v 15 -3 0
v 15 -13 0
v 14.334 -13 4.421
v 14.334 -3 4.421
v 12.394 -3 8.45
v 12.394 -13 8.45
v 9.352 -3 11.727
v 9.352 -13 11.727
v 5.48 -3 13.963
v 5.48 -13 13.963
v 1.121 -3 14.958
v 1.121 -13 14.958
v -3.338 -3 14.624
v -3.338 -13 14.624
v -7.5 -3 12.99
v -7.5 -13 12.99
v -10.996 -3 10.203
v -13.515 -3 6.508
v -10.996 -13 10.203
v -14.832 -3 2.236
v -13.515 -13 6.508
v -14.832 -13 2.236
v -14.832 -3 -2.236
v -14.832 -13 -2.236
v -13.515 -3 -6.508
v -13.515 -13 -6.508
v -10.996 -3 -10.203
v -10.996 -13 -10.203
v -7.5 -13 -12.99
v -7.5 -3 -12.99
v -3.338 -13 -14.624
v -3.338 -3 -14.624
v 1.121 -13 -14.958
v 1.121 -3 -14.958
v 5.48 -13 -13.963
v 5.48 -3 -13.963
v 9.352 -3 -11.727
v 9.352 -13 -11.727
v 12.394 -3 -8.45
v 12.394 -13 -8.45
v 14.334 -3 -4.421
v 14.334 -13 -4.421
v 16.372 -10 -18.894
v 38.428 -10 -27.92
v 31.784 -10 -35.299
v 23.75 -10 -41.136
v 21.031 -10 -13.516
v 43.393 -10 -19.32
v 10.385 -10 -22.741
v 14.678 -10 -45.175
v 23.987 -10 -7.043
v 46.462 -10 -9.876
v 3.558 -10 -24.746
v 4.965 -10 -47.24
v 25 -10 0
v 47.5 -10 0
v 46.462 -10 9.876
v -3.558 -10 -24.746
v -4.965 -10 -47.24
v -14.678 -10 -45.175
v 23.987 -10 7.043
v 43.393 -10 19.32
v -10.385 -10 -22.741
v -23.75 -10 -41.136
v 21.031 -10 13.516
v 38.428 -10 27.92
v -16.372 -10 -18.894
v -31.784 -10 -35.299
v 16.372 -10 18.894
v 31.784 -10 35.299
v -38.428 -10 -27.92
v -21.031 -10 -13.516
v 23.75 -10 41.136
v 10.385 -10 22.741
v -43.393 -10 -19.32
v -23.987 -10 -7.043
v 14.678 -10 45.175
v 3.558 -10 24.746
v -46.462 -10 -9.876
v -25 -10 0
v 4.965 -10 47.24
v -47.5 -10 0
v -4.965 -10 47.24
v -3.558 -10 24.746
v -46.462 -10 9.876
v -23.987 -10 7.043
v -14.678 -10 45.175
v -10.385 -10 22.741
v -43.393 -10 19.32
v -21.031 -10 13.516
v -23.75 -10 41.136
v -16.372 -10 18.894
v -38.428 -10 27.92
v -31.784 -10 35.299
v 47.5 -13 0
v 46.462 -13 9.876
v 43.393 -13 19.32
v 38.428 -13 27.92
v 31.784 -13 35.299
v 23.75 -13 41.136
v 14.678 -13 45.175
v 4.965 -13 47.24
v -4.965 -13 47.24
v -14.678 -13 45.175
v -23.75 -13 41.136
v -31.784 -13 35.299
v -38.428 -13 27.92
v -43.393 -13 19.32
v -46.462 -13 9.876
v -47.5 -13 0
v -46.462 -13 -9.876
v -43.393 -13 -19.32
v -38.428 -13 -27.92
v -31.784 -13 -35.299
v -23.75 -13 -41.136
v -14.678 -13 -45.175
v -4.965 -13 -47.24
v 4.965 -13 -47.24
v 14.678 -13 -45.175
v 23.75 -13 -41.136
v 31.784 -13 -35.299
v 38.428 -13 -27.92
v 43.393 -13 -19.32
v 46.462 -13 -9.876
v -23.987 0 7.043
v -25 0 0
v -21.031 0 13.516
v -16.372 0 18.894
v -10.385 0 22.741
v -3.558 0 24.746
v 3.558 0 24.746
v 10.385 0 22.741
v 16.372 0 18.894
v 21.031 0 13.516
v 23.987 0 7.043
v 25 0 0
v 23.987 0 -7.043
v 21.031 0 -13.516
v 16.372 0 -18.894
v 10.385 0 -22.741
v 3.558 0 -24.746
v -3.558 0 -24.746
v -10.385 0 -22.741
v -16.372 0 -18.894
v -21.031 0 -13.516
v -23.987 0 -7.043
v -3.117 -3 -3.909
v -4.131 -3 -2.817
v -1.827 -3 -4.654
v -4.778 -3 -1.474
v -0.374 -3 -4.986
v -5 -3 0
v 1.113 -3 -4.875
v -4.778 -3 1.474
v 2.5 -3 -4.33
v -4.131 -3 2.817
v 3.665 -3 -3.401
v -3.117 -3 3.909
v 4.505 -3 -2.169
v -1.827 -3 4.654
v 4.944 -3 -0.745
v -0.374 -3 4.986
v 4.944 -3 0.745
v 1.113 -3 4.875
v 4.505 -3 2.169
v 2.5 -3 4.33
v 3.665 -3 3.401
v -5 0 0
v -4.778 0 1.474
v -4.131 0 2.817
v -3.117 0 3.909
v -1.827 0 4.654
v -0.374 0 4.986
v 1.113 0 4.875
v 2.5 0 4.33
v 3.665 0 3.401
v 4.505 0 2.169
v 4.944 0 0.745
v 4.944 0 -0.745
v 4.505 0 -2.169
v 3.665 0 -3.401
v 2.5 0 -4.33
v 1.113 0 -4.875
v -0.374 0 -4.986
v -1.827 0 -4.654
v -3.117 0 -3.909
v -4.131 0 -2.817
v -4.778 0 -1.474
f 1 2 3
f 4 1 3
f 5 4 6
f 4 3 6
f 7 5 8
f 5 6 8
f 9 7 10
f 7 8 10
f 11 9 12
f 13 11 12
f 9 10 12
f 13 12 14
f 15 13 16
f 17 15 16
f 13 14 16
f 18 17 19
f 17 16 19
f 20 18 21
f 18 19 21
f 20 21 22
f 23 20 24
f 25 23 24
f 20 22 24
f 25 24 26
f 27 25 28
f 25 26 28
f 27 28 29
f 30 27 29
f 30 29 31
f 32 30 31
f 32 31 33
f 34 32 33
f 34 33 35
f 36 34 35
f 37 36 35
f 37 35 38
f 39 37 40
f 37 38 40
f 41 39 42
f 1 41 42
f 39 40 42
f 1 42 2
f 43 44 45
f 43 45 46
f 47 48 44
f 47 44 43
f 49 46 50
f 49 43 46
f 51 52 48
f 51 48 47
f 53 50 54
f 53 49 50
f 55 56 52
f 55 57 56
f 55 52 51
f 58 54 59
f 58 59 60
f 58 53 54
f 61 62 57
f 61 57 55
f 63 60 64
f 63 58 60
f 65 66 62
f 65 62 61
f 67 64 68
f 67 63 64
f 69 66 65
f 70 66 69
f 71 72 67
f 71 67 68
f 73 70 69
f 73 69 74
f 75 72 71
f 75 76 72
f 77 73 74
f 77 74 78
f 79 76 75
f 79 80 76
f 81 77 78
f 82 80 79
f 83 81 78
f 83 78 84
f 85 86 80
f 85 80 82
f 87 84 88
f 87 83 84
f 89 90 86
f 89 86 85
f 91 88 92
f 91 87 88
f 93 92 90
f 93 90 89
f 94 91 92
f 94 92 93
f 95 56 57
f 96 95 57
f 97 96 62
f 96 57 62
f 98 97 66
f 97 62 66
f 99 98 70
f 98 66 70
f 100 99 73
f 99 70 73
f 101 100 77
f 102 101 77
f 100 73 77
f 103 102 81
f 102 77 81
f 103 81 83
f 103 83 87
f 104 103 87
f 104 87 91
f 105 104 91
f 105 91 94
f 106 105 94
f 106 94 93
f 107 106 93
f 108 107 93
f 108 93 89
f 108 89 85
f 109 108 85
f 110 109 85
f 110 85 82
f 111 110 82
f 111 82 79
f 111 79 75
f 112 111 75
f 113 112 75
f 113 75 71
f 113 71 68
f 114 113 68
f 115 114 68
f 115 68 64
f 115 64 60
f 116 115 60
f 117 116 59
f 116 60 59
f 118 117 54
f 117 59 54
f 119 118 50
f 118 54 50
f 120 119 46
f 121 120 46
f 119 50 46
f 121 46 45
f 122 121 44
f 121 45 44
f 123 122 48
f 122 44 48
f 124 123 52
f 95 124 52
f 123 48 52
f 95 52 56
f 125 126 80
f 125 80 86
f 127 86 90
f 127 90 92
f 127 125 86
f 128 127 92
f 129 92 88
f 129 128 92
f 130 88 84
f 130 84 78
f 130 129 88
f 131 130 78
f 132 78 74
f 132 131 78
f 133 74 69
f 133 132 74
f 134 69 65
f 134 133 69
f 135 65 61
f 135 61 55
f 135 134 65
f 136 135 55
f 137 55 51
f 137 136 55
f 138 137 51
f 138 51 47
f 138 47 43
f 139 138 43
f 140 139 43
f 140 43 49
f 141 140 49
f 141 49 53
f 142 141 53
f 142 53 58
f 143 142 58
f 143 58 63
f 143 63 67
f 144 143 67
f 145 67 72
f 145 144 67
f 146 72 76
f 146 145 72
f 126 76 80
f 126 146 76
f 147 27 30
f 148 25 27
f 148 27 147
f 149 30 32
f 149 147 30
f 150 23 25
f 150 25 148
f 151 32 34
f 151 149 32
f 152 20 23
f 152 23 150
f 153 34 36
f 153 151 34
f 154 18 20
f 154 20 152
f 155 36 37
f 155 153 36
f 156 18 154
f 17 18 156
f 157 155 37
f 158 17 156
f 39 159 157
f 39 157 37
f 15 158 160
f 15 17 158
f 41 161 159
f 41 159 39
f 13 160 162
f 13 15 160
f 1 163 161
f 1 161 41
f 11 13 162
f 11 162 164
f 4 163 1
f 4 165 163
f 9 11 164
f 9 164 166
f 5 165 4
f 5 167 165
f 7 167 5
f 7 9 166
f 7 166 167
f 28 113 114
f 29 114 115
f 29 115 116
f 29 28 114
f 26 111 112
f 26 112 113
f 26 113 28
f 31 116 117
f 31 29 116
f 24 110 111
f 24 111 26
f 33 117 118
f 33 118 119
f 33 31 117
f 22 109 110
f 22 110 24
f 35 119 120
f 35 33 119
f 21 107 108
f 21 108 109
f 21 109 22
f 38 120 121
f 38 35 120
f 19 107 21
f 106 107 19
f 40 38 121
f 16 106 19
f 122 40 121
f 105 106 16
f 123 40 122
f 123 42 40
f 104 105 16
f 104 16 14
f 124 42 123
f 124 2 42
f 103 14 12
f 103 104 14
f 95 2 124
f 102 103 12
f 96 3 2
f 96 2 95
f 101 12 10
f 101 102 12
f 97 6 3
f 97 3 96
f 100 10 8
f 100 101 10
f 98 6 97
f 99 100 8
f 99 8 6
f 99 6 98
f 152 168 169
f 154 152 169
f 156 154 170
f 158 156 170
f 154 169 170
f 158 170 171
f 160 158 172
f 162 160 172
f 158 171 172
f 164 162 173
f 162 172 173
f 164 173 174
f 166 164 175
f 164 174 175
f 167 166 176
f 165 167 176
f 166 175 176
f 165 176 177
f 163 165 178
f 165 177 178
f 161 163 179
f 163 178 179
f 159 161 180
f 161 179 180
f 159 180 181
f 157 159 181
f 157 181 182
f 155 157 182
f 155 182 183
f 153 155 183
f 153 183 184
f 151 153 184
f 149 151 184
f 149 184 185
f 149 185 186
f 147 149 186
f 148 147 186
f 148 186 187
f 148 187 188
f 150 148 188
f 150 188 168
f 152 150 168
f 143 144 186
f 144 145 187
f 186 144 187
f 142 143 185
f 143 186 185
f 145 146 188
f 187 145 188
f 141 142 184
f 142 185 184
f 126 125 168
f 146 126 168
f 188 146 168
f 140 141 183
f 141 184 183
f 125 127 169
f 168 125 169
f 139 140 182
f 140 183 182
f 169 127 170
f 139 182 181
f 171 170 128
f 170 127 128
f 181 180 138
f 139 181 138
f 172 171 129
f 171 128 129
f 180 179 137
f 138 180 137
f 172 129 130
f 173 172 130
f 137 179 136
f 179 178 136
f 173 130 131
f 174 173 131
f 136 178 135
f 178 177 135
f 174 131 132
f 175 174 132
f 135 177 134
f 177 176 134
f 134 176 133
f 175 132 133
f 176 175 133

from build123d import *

# Parameters (mm, degrees)
F0_R     = 47.5
F1_DEPTH = 13
F2_R     = 15
F3_DEPTH = 10
F4_R     = 58.550263
F4_R_2   = 25
F5_DEPTH = 10
F6_R     = 5
F7_DEPTH = 25


with BuildPart() as f1:
    # F0 (on Front) → F1 (new body)
    with BuildSketch(Plane.XZ):
        Circle(F0_R)
    extrude(amount=F1_DEPTH)

    # F2 (on face) → F3 (cut)
    with BuildSketch(Plane.XZ.offset(13)):
        Circle(F2_R)
    extrude(amount=-F3_DEPTH, mode=Mode.SUBTRACT)

    # F4 (on face) → F5 (cut)
    with BuildSketch(Plane(origin=(0, 0, 0), x_dir=(-1, 0, 0), z_dir=(0, 1, 0))):
        with Locations((0, -4.284165)):
            Circle(F4_R)
        Circle(F4_R_2, mode=Mode.SUBTRACT)
    extrude(amount=-F5_DEPTH, mode=Mode.SUBTRACT)

    # F6 (on face) → F7 (cut)
    with BuildSketch(Plane(origin=(0, 0, 0), x_dir=(-1, 0, 0), z_dir=(0, 1, 0))):
        Circle(F6_R)
    extrude(amount=-F7_DEPTH, mode=Mode.SUBTRACT)


solid = f1.part
